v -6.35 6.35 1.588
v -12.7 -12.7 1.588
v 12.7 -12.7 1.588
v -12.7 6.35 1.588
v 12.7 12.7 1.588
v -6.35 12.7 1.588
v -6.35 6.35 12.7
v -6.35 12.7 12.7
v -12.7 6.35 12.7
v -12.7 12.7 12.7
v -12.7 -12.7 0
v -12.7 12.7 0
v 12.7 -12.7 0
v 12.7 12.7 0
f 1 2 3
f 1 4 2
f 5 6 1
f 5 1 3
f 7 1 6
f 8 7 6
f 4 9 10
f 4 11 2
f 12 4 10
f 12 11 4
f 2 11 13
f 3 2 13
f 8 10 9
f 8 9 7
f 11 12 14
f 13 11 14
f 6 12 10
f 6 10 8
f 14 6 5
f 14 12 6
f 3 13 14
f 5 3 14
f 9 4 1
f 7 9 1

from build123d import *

# Parameters (mm, degrees)
F1_DEPTH = 1.5875
F0_W     = 6.35
F0_H     = 6.35
F2_DEPTH = 12.7


# Not quite as in the source:
# - a length typed as a fraction of an inch, garbled in the dataset ("3 / 203.2 mm" for 3/8 in), is restored


with BuildPart() as f1:
    # F0 (on Top) → F1 (new body)
    with BuildSketch(Plane.XY):
        Polygon((-12.7, -12.7), (12.7, -12.7), (12.7, 12.7), (-6.35, 12.7), (-6.35, 6.35), (-12.7, 6.35), align=None)
    extrude(amount=F1_DEPTH)

    # F0 (on Top) → F2 (join)
    with BuildSketch(Plane.XY):
        with Locations((-9.525, 9.525)):
            Rectangle(F0_W, F0_H)
    extrude(amount=F2_DEPTH)


solid = f1.part
